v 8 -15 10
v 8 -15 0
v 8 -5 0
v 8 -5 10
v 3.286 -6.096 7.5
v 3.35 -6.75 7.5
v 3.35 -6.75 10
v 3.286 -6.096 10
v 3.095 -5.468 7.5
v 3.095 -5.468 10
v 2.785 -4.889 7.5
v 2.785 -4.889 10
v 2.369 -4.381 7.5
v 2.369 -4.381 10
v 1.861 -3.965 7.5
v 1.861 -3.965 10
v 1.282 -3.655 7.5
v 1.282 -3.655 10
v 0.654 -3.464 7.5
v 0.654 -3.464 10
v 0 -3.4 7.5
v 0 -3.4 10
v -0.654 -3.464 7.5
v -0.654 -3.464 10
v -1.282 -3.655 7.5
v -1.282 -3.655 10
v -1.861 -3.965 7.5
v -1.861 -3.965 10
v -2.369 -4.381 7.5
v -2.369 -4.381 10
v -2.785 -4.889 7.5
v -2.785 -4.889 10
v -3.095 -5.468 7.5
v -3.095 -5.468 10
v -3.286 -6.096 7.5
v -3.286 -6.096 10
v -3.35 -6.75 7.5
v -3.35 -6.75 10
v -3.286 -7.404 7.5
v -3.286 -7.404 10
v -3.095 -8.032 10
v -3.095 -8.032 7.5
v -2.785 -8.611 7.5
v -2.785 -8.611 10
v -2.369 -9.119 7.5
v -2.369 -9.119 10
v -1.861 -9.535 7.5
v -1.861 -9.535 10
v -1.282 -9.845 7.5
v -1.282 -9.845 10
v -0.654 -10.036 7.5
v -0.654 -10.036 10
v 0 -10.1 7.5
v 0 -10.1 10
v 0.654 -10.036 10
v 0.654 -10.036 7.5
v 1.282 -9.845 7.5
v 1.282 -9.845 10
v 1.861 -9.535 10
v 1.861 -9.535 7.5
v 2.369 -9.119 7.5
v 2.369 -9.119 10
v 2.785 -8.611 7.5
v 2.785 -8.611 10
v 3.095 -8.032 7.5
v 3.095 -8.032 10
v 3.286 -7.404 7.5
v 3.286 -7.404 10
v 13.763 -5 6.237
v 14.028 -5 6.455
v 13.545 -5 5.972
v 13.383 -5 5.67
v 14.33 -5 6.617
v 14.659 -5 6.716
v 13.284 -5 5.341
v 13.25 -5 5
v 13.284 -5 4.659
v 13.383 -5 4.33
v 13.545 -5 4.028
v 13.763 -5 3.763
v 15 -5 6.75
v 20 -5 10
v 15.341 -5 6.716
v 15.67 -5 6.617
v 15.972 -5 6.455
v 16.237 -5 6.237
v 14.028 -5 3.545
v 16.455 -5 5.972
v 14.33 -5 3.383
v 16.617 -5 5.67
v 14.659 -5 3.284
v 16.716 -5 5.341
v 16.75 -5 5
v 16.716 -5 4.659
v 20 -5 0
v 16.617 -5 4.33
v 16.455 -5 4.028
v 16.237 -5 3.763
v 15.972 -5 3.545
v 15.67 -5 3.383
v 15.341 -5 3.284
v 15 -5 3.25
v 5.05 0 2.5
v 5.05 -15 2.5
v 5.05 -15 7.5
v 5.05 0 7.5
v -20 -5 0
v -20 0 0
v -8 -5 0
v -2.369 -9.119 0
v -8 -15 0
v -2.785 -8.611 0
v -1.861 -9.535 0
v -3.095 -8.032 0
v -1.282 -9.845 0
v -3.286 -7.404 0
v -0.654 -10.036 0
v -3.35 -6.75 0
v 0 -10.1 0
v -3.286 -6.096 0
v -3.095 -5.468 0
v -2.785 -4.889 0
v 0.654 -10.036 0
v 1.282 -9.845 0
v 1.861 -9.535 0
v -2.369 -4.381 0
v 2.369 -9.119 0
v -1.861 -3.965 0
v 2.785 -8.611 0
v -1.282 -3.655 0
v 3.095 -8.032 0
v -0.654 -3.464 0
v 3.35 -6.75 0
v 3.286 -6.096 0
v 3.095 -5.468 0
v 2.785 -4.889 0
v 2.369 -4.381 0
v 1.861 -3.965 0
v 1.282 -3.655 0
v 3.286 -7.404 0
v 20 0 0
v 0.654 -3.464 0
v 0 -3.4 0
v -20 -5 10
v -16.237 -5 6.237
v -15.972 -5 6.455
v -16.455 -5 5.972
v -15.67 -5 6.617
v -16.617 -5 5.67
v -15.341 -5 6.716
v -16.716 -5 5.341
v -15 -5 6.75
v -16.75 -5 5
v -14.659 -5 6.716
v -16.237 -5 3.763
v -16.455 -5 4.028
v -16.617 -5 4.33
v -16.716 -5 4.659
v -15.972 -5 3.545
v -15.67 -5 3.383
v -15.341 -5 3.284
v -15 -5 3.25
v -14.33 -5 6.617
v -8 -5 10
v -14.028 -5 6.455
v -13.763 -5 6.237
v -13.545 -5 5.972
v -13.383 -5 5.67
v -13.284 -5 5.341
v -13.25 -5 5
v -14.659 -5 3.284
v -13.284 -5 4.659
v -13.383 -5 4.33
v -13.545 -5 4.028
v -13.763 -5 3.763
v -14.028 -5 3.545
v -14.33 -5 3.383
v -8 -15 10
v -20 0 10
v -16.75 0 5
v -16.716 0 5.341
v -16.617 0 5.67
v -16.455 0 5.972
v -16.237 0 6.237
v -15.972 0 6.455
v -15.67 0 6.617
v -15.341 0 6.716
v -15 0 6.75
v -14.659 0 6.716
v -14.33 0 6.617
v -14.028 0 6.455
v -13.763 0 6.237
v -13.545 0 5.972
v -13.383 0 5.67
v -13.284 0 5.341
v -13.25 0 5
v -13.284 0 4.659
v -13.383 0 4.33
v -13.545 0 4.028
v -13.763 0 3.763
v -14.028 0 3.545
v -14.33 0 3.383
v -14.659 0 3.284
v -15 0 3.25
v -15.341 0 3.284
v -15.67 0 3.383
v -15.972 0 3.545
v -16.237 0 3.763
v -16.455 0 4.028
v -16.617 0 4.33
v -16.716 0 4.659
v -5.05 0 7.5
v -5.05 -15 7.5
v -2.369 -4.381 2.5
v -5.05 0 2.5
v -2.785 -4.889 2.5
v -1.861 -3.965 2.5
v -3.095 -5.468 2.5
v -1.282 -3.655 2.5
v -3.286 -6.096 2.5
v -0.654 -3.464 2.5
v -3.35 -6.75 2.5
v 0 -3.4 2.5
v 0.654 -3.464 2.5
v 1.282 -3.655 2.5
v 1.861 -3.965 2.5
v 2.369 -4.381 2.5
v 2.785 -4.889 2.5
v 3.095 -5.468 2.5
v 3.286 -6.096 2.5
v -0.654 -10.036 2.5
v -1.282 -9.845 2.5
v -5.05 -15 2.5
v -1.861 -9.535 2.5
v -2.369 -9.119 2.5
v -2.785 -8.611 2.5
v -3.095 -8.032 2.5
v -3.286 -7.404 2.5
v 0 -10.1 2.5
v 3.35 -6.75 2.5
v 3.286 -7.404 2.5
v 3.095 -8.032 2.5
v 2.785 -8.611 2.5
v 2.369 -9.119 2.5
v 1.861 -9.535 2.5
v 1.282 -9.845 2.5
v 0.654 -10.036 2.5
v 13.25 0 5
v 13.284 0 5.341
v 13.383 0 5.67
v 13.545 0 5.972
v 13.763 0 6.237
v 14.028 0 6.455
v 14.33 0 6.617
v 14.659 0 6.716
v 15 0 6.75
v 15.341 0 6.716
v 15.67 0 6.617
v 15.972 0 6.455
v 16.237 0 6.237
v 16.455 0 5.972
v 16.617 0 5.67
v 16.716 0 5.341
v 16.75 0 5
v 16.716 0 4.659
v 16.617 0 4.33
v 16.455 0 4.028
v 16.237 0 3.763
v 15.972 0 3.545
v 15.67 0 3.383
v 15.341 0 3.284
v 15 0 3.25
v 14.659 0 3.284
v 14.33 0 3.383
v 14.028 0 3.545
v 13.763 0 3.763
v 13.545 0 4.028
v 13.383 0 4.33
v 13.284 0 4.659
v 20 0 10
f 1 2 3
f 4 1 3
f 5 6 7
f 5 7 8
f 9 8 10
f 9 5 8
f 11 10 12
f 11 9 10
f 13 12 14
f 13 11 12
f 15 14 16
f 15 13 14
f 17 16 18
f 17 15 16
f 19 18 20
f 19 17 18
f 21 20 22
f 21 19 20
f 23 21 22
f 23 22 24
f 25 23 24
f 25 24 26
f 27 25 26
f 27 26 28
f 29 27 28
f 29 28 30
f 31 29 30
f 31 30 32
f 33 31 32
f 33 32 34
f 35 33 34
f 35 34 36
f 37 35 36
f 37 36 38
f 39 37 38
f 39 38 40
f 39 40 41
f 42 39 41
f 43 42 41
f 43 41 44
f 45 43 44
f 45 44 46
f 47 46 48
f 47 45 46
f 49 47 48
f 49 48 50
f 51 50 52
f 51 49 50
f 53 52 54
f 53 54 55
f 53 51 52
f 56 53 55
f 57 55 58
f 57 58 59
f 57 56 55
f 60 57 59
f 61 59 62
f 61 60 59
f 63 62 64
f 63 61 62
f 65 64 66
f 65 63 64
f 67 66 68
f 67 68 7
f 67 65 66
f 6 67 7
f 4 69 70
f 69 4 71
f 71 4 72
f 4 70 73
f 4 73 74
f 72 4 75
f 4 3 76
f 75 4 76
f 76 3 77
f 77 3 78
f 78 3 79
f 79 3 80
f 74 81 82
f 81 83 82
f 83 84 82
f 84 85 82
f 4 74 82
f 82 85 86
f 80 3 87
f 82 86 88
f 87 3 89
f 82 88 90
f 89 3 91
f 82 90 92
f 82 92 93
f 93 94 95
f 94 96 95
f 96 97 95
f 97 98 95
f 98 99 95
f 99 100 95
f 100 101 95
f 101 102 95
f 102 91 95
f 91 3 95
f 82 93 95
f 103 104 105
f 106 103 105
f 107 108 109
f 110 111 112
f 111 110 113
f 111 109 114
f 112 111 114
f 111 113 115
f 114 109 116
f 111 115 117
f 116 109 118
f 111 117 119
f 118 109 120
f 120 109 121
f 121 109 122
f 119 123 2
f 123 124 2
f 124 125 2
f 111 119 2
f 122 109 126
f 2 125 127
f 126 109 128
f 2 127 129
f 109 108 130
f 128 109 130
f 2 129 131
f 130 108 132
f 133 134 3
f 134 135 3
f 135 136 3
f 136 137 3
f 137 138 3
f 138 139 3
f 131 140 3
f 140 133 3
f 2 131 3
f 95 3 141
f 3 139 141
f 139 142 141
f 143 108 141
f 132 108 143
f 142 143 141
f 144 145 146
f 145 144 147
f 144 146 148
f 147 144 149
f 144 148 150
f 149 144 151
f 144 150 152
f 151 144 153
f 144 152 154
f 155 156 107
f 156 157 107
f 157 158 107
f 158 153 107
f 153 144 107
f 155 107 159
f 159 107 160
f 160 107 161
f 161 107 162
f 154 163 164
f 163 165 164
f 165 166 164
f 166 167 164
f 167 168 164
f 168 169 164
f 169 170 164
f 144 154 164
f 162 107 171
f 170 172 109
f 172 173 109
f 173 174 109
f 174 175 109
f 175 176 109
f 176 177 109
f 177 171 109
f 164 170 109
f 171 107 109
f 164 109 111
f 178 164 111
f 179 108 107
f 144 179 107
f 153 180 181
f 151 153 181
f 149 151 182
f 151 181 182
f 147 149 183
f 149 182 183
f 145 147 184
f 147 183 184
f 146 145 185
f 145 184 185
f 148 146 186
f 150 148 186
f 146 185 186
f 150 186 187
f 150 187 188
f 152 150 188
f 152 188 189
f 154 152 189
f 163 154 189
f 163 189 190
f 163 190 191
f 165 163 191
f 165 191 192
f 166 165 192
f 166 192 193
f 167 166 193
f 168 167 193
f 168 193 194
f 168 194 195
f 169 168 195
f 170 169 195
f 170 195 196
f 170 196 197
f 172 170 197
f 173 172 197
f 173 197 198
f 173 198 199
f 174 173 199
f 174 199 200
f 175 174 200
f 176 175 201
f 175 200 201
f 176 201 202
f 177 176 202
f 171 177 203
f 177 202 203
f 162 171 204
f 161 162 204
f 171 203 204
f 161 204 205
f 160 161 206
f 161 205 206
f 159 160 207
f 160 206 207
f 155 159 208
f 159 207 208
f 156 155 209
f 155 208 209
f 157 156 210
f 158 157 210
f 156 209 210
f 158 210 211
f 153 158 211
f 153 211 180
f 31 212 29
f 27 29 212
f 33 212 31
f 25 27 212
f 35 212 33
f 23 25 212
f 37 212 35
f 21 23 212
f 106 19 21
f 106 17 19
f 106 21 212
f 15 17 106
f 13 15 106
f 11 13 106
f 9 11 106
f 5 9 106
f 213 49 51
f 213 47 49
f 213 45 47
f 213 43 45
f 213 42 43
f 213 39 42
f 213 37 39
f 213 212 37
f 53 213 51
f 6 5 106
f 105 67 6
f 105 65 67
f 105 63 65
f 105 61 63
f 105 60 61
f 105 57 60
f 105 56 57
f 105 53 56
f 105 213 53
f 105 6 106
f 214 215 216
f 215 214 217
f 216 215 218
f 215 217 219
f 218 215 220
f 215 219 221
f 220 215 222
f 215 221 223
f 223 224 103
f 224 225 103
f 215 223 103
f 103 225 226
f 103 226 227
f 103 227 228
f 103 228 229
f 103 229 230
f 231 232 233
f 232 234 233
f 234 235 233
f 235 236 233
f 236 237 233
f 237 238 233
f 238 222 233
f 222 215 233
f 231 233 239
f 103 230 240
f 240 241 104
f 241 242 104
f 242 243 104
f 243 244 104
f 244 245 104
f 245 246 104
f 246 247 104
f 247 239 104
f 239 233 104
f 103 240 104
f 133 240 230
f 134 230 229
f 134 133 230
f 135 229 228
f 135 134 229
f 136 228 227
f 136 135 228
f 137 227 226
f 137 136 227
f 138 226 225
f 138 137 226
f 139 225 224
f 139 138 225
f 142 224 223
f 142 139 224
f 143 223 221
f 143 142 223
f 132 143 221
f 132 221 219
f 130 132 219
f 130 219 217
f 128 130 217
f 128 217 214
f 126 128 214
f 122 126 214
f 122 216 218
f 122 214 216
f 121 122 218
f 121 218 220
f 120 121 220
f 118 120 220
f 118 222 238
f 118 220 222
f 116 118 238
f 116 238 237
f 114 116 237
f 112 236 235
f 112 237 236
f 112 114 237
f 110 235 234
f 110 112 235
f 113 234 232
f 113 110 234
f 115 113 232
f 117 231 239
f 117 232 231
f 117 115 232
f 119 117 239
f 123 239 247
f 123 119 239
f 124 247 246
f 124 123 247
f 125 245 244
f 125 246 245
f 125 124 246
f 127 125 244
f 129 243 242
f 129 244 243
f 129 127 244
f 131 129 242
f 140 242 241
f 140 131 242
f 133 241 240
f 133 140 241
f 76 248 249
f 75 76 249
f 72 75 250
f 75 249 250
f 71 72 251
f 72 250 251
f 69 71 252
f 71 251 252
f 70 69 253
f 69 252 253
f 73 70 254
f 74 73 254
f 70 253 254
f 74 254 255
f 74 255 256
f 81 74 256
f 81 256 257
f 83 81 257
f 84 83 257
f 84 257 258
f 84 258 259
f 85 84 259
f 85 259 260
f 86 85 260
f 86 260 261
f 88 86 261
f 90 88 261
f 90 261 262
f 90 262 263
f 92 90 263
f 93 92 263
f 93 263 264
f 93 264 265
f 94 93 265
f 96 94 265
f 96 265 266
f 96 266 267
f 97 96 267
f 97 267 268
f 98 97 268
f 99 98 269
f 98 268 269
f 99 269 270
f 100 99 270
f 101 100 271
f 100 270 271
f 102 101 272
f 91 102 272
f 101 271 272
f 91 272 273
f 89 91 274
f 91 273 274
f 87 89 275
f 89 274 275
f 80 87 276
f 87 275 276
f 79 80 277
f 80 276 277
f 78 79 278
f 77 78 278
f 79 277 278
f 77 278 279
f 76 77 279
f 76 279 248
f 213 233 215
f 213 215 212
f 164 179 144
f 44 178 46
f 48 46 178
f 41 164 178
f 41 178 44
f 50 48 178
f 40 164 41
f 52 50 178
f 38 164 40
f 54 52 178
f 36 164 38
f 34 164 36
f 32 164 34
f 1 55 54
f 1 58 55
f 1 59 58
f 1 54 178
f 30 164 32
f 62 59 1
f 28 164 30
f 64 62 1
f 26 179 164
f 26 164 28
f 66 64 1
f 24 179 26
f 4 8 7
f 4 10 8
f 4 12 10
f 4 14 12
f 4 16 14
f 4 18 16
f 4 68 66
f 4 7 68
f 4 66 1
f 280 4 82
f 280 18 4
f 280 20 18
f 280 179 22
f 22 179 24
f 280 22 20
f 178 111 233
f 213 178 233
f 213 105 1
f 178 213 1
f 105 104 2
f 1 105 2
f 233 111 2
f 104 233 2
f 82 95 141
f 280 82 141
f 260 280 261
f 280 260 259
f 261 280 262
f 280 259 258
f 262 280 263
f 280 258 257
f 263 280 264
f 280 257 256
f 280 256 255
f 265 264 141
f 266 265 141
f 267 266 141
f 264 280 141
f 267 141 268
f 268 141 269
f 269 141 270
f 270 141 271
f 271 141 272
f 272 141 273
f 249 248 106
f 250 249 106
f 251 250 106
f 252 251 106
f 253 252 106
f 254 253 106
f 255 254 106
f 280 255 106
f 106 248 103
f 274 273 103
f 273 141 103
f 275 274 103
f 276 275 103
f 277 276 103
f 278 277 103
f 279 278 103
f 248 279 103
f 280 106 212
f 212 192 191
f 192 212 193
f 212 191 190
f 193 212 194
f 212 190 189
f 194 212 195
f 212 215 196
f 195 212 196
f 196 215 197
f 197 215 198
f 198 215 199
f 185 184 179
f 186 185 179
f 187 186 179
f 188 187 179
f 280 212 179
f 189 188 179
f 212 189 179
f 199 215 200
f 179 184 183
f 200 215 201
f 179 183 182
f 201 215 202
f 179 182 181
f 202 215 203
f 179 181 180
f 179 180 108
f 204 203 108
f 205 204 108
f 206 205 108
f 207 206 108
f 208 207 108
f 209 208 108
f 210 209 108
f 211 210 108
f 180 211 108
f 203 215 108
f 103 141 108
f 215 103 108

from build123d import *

# Parameters (mm, degrees)
ESBO_O1_R                = 3.35
RESSALTO_EXTRUS_O1_DEPTH = 10
ESBO_O2_R                = 1.75
CORTE_EXTRUS_O1_DEPTH    = 10
ESBO_O3_W                = 10.1
ESBO_O3_H                = 5
CORTE_EXTRUS_O2_DEPTH    = 20


with BuildPart() as part:
    # Esboço1 → Ressalto-extrusão1 (new body)
    with BuildSketch(Plane.XY):
        Polygon((-8, -5), (-8, -15), (8, -15), (8, -5), (20, -5), (20, 0), (-20, 0), (-20, -5), align=None)
        with Locations((0, -6.75)):
            Circle(ESBO_O1_R, mode=Mode.SUBTRACT)
    extrude(amount=RESSALTO_EXTRUS_O1_DEPTH)

    # Esboço2 → Corte-extrusão1 (cut)
    with BuildSketch(Plane(origin=(0, 0, 0), x_dir=(1, 0, 0), z_dir=(0, 1, 0))):
        with Locations(Location((-15, -5, 0), (0, 0, 180))):
            Circle(ESBO_O2_R)
        with Locations(Location((15, -5, 0), (0, 0, 180))):
            Circle(ESBO_O2_R)
    extrude(amount=-CORTE_EXTRUS_O1_DEPTH, mode=Mode.SUBTRACT)

    # Esboço3 → Corte-extrusão2 (cut)
    with BuildSketch(Plane.XZ.offset(15)):
        with Locations((0, 5)):
            Rectangle(ESBO_O3_W, ESBO_O3_H)
    extrude(amount=-CORTE_EXTRUS_O2_DEPTH, mode=Mode.SUBTRACT)


solid = part.part
